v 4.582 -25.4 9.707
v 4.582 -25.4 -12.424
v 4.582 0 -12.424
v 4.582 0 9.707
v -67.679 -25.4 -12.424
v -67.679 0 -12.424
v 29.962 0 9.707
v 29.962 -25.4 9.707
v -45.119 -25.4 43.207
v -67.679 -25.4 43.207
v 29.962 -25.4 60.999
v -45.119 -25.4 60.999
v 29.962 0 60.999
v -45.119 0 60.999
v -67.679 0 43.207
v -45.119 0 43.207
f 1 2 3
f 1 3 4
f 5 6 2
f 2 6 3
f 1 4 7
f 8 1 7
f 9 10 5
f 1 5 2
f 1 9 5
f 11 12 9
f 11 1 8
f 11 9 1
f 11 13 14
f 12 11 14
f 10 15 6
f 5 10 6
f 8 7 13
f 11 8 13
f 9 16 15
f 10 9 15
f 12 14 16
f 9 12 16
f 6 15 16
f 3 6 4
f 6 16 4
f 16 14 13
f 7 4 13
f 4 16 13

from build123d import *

# Parameters (mm, degrees)
F0_W     = 49.7014243156
F0_H     = 33.4998108447
F1_DEPTH = 25.4


with BuildPart() as f1:
    # F0 (on Front) → F1 (new body)
    with BuildSketch(Plane.XZ):
        Polygon((-45.1190248132, 60.9986558557), (-45.1190248132, 43.2065278292), (4.5823995024, 43.2065278292), (4.5823995024, 9.7067169845), (29.9618467689, 9.7067169845), (29.9618467689, 60.9986558557), align=None)
        Polygon((-45.1190248132, 43.2065278292), (-67.6785334945, 43.2065278292), (-67.6785334945, -12.4243786559), (4.5823995024, -12.4243786559), (4.5823995024, 9.7067169845), (-45.1190248132, 9.7067169845), align=None)
        with Locations((-20.2683126554, 26.4566224068)):
            Rectangle(F0_W, F0_H)
    extrude(amount=F1_DEPTH)


solid = f1.part
